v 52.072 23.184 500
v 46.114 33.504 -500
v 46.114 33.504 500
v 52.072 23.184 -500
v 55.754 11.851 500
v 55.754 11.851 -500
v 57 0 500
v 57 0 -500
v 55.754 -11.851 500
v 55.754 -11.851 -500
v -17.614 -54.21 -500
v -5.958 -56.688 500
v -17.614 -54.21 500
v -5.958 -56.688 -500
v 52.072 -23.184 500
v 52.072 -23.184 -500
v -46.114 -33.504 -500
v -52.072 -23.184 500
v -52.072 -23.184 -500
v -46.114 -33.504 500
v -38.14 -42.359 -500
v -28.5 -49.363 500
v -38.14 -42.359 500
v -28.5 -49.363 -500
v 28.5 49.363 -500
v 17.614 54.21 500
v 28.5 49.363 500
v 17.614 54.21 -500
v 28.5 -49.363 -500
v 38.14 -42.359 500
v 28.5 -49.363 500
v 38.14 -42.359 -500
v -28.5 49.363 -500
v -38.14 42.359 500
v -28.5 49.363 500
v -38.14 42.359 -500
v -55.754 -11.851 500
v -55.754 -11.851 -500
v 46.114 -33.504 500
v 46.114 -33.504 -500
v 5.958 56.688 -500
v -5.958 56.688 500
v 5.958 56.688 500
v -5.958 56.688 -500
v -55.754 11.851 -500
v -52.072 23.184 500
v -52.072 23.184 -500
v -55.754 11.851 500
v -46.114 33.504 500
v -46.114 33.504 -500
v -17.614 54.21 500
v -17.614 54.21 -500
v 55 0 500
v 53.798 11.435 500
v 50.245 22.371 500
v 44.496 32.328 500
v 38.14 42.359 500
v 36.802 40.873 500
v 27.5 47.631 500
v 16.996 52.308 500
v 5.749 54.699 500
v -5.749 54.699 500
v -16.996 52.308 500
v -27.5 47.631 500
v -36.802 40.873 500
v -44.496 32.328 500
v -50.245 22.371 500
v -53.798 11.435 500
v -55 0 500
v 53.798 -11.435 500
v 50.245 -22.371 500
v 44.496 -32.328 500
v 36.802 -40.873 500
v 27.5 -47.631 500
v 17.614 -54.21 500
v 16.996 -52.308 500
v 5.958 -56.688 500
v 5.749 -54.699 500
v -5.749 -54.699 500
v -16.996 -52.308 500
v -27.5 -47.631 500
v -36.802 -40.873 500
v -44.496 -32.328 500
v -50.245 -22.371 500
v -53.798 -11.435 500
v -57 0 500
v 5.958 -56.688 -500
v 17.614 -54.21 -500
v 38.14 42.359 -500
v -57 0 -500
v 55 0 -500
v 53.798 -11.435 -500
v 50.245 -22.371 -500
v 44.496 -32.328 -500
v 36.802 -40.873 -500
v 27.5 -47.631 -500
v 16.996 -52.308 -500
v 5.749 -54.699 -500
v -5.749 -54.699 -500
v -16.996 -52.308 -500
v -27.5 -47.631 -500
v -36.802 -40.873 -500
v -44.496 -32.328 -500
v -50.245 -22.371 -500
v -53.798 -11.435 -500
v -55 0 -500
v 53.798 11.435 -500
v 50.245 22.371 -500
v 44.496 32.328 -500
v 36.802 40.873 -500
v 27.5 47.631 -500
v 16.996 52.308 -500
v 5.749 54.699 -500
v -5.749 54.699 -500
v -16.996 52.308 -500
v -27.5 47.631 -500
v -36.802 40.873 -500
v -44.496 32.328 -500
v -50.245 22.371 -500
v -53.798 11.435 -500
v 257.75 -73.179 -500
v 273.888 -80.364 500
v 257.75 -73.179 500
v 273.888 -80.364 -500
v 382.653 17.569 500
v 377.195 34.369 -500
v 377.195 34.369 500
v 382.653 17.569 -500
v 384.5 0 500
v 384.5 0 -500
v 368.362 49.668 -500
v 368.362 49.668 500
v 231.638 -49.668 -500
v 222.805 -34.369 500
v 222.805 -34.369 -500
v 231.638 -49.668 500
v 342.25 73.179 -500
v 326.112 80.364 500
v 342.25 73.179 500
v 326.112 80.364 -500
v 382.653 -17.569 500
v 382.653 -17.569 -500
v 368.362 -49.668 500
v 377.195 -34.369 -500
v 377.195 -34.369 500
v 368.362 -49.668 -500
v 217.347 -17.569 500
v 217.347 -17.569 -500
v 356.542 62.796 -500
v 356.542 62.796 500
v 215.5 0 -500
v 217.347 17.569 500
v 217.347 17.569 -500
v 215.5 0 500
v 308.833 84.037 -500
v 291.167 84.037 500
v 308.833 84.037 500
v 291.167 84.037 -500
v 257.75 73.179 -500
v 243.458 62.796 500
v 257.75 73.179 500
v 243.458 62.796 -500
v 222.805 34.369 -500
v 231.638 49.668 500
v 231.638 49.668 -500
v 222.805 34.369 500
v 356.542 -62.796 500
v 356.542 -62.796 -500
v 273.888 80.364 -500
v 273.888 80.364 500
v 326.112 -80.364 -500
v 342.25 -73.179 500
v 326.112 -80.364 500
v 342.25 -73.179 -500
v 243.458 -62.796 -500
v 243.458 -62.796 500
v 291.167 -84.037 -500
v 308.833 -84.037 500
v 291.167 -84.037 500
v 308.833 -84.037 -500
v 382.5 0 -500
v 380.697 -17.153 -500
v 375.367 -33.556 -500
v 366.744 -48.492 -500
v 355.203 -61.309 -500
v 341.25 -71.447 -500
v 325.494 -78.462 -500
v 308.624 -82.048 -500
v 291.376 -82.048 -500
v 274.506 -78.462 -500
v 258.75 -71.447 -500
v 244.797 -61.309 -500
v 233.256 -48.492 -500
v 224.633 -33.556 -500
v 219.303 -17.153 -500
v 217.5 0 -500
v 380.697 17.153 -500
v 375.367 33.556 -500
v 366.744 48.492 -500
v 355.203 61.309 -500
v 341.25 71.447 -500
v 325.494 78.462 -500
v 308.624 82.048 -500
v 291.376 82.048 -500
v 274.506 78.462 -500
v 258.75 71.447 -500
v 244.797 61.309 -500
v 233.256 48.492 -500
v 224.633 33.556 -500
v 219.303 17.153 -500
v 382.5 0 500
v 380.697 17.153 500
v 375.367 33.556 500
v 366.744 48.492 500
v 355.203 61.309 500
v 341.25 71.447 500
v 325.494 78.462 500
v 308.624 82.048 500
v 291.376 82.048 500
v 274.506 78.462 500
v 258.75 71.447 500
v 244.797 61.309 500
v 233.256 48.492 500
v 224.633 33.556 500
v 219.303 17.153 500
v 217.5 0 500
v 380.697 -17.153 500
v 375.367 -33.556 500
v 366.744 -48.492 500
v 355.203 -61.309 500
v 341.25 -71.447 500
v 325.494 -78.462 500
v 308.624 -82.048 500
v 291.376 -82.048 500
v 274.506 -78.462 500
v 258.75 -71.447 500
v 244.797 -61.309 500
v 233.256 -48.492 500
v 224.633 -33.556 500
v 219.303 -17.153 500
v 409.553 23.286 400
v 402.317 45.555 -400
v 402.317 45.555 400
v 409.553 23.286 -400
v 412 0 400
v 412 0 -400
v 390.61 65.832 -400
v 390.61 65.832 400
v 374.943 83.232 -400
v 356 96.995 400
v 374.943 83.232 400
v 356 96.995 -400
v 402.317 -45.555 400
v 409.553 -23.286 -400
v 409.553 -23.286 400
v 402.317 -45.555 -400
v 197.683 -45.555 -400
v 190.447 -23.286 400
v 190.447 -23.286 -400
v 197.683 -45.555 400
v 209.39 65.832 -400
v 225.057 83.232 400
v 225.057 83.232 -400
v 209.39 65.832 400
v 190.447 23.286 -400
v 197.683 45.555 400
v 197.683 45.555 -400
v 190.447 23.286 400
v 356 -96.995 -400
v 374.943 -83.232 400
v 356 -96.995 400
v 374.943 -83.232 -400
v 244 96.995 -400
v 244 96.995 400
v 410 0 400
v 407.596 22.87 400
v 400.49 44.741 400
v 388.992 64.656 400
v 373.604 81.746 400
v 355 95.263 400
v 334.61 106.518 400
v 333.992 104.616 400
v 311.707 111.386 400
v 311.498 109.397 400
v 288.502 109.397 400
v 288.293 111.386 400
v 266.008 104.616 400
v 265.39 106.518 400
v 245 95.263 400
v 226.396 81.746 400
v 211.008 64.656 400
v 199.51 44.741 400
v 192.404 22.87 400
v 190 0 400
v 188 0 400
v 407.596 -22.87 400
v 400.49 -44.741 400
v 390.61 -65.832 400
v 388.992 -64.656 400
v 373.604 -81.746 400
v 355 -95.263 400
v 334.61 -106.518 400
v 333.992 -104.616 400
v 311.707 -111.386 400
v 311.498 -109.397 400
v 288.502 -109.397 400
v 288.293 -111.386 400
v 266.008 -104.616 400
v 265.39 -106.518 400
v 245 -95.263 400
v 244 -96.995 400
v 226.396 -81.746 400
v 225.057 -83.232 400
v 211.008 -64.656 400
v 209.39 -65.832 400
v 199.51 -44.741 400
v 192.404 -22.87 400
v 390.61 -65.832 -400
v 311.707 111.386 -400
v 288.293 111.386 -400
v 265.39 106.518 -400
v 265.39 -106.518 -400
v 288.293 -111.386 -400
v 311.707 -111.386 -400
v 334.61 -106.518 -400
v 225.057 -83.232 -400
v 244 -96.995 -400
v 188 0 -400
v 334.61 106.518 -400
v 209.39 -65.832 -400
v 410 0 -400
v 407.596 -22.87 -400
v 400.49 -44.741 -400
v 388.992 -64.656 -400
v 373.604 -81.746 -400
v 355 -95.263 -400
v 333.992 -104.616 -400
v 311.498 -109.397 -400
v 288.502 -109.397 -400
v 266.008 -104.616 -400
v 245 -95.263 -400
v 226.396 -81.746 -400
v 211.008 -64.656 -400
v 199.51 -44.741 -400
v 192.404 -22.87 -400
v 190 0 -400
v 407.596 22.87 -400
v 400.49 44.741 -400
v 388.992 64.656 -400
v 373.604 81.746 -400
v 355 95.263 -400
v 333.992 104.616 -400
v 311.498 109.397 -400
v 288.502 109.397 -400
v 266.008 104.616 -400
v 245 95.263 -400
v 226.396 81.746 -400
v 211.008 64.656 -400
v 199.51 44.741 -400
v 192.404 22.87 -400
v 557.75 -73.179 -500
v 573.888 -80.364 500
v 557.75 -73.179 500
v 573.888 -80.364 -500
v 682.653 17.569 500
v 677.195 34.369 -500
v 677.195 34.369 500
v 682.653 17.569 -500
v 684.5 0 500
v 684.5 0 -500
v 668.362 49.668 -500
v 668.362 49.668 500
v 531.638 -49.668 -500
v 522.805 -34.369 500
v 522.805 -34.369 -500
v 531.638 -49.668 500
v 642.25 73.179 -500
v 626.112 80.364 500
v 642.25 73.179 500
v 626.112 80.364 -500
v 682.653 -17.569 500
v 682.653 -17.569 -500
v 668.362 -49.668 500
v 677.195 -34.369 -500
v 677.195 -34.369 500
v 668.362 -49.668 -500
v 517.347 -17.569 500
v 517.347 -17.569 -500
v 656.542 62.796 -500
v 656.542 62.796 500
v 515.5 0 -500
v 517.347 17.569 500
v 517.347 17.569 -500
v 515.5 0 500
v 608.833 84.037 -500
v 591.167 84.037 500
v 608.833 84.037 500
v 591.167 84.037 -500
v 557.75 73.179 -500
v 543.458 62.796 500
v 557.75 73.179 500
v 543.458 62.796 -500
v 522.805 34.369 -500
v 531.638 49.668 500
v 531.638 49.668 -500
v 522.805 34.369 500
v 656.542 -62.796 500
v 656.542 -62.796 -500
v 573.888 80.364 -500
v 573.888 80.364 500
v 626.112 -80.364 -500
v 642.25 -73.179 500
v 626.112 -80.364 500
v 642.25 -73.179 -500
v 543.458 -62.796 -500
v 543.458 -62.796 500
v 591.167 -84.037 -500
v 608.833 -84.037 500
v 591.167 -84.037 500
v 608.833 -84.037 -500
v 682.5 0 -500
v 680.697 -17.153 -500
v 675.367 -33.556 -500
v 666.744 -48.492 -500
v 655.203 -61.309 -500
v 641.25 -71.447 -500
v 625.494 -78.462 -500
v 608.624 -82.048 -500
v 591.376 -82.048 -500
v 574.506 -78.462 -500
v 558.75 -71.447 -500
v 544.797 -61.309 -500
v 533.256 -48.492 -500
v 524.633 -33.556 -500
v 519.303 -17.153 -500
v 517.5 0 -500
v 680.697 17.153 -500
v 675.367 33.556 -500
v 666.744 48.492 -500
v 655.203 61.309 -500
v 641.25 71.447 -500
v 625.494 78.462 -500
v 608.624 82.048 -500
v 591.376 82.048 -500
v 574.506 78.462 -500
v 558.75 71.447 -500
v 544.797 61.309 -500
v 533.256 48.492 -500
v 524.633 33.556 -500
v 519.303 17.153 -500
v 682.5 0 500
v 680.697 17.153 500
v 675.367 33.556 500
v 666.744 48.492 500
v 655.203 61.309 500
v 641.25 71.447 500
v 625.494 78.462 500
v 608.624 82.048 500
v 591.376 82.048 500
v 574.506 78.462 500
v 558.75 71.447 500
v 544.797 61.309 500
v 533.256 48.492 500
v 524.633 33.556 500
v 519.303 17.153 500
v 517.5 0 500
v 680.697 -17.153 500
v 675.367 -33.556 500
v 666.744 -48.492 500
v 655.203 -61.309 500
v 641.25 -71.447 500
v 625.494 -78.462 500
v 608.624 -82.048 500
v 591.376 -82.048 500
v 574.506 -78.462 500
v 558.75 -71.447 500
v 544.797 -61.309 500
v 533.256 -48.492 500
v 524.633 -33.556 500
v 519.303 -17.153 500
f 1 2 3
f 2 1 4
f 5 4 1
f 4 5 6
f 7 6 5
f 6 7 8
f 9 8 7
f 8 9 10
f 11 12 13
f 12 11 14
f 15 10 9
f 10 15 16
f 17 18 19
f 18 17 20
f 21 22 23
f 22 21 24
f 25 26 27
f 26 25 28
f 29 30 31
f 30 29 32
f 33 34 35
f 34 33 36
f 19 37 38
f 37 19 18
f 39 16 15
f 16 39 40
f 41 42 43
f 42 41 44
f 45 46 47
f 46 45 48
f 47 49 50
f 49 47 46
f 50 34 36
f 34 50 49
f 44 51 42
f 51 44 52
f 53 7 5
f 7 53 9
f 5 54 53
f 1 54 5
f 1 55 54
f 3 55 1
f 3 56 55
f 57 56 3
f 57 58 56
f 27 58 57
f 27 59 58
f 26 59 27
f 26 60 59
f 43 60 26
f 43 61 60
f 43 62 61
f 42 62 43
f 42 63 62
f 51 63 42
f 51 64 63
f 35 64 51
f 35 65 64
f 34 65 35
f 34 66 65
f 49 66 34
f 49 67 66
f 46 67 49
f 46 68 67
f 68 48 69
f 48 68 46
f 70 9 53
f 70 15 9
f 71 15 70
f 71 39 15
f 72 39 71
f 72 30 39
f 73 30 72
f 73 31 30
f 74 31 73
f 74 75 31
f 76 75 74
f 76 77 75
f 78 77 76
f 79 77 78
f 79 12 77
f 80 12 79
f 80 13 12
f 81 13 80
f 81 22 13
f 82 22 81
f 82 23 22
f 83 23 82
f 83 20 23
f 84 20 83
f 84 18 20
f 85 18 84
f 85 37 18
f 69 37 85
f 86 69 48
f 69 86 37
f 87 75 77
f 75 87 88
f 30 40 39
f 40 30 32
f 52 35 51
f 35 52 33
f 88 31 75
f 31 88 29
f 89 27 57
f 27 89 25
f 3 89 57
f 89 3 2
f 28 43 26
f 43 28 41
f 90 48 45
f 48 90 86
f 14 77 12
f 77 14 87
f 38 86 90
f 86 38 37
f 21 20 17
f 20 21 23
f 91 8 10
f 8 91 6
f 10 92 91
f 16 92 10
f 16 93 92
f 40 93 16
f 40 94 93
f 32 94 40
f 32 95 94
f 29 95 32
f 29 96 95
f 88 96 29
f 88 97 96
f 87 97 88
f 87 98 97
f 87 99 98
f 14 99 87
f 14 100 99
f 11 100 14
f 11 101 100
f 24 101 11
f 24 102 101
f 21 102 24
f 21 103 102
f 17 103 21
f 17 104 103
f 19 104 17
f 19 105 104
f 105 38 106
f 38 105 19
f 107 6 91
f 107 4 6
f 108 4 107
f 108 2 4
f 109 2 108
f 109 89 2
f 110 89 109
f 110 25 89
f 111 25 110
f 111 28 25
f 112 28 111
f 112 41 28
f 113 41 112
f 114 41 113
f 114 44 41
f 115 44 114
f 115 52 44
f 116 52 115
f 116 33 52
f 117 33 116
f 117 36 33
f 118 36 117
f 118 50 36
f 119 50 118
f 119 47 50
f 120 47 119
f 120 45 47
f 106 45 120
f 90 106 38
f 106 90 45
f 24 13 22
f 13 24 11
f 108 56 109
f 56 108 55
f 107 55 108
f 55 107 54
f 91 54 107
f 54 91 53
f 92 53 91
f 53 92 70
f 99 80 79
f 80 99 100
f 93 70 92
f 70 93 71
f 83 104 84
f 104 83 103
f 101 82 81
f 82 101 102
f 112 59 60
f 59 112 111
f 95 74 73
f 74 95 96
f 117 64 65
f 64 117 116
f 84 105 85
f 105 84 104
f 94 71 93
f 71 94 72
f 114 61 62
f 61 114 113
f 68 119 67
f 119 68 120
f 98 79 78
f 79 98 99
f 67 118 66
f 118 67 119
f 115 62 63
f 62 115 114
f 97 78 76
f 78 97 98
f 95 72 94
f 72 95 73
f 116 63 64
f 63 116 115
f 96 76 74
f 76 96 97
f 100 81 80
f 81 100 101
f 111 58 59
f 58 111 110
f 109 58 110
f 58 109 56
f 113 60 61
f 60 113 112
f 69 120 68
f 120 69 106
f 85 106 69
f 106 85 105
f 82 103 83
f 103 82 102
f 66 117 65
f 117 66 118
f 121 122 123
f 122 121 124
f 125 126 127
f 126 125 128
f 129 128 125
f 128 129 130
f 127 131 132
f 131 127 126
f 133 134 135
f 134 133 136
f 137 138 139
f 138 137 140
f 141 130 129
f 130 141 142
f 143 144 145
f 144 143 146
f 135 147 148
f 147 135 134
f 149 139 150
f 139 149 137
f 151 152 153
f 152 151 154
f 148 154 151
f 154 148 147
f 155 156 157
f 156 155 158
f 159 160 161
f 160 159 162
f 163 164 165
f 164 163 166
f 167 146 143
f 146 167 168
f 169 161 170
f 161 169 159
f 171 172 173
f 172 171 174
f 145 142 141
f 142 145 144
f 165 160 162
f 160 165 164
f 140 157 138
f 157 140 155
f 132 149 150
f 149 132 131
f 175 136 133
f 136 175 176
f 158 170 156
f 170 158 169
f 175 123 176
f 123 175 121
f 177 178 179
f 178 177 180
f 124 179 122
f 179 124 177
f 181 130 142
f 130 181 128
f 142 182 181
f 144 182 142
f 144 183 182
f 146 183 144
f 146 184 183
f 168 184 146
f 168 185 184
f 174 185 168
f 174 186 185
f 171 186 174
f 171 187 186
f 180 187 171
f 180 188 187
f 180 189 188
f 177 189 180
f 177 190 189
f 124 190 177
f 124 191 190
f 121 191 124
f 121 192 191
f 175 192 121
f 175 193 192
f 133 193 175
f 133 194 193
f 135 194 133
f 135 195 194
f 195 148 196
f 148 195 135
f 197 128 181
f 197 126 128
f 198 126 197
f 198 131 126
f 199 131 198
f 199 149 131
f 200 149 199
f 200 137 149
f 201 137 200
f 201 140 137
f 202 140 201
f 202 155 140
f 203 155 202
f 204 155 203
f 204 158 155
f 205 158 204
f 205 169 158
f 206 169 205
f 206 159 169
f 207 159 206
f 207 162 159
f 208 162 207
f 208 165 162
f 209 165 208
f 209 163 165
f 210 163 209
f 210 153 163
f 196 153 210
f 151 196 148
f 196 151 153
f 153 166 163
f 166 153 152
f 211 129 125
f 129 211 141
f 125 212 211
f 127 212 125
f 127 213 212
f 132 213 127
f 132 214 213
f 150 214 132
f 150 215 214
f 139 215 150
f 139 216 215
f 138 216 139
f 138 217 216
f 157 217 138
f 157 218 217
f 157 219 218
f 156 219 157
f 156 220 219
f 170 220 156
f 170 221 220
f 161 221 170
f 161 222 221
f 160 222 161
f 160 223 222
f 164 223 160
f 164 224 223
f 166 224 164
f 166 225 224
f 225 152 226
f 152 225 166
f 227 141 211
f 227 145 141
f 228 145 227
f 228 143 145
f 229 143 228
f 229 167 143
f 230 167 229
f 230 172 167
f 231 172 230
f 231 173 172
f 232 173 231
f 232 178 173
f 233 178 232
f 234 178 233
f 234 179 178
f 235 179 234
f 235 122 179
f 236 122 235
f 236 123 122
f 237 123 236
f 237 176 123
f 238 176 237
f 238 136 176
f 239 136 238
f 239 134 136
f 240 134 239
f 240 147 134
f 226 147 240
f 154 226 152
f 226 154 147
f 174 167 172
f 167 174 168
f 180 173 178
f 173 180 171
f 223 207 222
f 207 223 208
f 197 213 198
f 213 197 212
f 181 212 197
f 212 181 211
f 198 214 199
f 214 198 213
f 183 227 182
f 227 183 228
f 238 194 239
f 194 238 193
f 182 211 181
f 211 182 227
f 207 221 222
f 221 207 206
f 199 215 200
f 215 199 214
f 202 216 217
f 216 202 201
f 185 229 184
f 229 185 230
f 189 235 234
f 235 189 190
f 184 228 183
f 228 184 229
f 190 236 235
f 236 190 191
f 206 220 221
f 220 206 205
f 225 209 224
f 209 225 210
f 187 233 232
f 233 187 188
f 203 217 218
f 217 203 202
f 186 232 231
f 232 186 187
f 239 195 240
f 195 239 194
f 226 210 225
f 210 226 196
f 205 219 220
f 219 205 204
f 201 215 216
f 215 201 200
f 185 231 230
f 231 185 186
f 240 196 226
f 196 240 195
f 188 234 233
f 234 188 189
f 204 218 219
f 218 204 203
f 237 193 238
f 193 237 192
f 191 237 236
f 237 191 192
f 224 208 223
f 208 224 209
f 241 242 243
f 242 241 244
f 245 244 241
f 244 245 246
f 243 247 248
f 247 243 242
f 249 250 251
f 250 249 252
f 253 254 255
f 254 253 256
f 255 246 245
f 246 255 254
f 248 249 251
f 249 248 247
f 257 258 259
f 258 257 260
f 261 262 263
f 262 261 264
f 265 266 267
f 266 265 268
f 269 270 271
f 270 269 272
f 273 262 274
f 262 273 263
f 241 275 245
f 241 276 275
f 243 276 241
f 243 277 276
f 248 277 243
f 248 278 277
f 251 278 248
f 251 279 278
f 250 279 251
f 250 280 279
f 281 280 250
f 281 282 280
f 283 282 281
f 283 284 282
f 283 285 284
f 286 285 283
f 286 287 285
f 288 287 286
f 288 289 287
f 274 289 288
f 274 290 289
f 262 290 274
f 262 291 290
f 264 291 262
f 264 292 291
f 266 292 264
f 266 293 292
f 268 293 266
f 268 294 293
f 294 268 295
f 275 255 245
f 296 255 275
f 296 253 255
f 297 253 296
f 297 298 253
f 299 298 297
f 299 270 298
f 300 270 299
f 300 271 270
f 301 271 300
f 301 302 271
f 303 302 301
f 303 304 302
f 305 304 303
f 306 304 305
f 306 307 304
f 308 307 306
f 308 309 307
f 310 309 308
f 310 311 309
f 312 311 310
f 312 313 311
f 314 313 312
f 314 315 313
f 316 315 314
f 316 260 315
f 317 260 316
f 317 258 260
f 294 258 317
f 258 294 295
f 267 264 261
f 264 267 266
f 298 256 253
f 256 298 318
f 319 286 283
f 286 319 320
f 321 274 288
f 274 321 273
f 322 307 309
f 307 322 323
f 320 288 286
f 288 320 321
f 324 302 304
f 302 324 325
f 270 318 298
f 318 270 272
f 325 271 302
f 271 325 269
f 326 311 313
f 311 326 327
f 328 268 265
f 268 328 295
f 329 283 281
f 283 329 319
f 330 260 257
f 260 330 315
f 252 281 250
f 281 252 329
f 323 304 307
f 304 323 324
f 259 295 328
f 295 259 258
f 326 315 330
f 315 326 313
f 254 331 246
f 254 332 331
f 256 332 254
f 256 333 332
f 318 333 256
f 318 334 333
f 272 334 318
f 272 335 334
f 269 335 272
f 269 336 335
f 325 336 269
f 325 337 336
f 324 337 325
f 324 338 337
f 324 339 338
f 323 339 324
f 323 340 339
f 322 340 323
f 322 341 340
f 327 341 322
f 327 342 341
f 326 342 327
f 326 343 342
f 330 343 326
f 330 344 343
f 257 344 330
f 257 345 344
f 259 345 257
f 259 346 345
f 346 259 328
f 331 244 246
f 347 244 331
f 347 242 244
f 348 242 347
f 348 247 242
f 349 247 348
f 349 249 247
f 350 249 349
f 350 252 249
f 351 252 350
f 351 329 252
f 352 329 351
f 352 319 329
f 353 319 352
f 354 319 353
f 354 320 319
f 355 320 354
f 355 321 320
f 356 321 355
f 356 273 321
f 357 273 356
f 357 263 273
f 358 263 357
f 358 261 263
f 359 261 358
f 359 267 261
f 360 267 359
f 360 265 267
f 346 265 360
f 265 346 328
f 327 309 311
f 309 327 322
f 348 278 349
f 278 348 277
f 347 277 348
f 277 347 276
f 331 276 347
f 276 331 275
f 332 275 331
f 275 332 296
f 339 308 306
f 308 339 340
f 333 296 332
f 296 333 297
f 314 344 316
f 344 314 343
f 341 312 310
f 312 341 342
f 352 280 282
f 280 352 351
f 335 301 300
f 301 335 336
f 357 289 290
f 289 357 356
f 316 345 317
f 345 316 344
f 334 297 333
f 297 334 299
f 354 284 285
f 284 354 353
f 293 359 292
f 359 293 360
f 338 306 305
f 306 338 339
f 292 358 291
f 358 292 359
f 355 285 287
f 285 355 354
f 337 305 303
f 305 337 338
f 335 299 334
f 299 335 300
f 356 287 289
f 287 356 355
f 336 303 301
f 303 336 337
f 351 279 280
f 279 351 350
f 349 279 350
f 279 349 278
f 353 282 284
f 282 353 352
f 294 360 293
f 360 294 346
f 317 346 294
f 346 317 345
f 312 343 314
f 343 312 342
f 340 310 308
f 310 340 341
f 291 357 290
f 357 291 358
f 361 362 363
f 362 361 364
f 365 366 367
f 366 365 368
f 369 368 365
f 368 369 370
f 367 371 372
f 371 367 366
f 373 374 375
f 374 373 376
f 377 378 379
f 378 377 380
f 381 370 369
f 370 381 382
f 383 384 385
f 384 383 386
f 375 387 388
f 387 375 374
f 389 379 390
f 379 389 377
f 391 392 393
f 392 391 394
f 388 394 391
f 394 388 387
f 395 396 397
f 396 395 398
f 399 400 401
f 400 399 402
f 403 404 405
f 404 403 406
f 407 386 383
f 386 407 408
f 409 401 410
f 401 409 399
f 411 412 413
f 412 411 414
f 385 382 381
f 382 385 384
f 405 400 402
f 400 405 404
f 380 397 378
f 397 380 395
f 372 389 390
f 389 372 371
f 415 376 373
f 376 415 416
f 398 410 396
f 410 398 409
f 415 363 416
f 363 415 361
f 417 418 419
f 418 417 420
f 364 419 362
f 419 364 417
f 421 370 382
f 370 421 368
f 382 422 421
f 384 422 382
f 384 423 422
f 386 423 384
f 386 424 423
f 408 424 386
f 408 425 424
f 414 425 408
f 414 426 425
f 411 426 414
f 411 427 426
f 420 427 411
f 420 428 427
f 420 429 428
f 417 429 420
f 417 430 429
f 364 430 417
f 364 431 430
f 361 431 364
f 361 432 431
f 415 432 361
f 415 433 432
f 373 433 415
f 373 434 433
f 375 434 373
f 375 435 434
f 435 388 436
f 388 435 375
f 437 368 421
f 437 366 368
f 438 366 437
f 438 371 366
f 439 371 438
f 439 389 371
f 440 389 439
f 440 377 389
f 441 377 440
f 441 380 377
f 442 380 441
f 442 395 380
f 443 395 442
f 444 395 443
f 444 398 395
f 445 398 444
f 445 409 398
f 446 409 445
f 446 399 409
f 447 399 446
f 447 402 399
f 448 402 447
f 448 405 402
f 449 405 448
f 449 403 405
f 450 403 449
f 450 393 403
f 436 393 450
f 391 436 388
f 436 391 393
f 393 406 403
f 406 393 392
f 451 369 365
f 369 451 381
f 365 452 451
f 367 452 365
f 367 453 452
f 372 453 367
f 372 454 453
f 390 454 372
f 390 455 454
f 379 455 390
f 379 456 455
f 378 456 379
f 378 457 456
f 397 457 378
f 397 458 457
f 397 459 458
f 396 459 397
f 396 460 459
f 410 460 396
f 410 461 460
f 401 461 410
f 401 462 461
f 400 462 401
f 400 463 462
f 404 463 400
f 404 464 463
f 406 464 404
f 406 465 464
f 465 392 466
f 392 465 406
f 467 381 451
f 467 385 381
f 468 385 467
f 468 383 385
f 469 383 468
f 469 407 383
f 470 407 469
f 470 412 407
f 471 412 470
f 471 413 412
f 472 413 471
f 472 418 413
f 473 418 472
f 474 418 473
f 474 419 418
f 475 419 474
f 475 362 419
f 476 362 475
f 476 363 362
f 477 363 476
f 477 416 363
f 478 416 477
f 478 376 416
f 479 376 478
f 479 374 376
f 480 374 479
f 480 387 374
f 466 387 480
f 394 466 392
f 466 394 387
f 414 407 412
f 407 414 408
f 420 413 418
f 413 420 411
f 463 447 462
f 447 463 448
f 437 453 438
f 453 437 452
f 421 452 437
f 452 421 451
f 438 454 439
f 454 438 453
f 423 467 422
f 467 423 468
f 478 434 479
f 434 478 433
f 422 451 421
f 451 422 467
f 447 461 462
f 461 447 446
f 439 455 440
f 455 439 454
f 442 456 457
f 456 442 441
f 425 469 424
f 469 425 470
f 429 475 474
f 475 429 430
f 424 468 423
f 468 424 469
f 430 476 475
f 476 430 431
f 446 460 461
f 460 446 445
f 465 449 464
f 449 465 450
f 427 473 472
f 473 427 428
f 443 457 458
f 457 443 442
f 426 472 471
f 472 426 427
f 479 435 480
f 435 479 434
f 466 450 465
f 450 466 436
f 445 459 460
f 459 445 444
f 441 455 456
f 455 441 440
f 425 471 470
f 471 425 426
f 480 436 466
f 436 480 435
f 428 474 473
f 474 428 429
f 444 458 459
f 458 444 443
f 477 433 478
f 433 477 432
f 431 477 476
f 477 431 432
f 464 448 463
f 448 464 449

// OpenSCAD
module pipe(l, d_inner, d_outer) {
    difference() {
        cylinder(h = l, r = d_outer/2, center = true);
        cylinder(h = l*1.01, r = d_inner/2, center = true);
    }
}

// fire pipe
translate([0, 0, 0]) pipe(1000, 110, 114);
// water heater pipe
translate([300, 0, 0])
    union() {
        pipe(1000, 165, 169);
        pipe(800, 220, 224);
    }
// chimney pipe
translate([600, 0, 0]) pipe(1000, 165, 169);
